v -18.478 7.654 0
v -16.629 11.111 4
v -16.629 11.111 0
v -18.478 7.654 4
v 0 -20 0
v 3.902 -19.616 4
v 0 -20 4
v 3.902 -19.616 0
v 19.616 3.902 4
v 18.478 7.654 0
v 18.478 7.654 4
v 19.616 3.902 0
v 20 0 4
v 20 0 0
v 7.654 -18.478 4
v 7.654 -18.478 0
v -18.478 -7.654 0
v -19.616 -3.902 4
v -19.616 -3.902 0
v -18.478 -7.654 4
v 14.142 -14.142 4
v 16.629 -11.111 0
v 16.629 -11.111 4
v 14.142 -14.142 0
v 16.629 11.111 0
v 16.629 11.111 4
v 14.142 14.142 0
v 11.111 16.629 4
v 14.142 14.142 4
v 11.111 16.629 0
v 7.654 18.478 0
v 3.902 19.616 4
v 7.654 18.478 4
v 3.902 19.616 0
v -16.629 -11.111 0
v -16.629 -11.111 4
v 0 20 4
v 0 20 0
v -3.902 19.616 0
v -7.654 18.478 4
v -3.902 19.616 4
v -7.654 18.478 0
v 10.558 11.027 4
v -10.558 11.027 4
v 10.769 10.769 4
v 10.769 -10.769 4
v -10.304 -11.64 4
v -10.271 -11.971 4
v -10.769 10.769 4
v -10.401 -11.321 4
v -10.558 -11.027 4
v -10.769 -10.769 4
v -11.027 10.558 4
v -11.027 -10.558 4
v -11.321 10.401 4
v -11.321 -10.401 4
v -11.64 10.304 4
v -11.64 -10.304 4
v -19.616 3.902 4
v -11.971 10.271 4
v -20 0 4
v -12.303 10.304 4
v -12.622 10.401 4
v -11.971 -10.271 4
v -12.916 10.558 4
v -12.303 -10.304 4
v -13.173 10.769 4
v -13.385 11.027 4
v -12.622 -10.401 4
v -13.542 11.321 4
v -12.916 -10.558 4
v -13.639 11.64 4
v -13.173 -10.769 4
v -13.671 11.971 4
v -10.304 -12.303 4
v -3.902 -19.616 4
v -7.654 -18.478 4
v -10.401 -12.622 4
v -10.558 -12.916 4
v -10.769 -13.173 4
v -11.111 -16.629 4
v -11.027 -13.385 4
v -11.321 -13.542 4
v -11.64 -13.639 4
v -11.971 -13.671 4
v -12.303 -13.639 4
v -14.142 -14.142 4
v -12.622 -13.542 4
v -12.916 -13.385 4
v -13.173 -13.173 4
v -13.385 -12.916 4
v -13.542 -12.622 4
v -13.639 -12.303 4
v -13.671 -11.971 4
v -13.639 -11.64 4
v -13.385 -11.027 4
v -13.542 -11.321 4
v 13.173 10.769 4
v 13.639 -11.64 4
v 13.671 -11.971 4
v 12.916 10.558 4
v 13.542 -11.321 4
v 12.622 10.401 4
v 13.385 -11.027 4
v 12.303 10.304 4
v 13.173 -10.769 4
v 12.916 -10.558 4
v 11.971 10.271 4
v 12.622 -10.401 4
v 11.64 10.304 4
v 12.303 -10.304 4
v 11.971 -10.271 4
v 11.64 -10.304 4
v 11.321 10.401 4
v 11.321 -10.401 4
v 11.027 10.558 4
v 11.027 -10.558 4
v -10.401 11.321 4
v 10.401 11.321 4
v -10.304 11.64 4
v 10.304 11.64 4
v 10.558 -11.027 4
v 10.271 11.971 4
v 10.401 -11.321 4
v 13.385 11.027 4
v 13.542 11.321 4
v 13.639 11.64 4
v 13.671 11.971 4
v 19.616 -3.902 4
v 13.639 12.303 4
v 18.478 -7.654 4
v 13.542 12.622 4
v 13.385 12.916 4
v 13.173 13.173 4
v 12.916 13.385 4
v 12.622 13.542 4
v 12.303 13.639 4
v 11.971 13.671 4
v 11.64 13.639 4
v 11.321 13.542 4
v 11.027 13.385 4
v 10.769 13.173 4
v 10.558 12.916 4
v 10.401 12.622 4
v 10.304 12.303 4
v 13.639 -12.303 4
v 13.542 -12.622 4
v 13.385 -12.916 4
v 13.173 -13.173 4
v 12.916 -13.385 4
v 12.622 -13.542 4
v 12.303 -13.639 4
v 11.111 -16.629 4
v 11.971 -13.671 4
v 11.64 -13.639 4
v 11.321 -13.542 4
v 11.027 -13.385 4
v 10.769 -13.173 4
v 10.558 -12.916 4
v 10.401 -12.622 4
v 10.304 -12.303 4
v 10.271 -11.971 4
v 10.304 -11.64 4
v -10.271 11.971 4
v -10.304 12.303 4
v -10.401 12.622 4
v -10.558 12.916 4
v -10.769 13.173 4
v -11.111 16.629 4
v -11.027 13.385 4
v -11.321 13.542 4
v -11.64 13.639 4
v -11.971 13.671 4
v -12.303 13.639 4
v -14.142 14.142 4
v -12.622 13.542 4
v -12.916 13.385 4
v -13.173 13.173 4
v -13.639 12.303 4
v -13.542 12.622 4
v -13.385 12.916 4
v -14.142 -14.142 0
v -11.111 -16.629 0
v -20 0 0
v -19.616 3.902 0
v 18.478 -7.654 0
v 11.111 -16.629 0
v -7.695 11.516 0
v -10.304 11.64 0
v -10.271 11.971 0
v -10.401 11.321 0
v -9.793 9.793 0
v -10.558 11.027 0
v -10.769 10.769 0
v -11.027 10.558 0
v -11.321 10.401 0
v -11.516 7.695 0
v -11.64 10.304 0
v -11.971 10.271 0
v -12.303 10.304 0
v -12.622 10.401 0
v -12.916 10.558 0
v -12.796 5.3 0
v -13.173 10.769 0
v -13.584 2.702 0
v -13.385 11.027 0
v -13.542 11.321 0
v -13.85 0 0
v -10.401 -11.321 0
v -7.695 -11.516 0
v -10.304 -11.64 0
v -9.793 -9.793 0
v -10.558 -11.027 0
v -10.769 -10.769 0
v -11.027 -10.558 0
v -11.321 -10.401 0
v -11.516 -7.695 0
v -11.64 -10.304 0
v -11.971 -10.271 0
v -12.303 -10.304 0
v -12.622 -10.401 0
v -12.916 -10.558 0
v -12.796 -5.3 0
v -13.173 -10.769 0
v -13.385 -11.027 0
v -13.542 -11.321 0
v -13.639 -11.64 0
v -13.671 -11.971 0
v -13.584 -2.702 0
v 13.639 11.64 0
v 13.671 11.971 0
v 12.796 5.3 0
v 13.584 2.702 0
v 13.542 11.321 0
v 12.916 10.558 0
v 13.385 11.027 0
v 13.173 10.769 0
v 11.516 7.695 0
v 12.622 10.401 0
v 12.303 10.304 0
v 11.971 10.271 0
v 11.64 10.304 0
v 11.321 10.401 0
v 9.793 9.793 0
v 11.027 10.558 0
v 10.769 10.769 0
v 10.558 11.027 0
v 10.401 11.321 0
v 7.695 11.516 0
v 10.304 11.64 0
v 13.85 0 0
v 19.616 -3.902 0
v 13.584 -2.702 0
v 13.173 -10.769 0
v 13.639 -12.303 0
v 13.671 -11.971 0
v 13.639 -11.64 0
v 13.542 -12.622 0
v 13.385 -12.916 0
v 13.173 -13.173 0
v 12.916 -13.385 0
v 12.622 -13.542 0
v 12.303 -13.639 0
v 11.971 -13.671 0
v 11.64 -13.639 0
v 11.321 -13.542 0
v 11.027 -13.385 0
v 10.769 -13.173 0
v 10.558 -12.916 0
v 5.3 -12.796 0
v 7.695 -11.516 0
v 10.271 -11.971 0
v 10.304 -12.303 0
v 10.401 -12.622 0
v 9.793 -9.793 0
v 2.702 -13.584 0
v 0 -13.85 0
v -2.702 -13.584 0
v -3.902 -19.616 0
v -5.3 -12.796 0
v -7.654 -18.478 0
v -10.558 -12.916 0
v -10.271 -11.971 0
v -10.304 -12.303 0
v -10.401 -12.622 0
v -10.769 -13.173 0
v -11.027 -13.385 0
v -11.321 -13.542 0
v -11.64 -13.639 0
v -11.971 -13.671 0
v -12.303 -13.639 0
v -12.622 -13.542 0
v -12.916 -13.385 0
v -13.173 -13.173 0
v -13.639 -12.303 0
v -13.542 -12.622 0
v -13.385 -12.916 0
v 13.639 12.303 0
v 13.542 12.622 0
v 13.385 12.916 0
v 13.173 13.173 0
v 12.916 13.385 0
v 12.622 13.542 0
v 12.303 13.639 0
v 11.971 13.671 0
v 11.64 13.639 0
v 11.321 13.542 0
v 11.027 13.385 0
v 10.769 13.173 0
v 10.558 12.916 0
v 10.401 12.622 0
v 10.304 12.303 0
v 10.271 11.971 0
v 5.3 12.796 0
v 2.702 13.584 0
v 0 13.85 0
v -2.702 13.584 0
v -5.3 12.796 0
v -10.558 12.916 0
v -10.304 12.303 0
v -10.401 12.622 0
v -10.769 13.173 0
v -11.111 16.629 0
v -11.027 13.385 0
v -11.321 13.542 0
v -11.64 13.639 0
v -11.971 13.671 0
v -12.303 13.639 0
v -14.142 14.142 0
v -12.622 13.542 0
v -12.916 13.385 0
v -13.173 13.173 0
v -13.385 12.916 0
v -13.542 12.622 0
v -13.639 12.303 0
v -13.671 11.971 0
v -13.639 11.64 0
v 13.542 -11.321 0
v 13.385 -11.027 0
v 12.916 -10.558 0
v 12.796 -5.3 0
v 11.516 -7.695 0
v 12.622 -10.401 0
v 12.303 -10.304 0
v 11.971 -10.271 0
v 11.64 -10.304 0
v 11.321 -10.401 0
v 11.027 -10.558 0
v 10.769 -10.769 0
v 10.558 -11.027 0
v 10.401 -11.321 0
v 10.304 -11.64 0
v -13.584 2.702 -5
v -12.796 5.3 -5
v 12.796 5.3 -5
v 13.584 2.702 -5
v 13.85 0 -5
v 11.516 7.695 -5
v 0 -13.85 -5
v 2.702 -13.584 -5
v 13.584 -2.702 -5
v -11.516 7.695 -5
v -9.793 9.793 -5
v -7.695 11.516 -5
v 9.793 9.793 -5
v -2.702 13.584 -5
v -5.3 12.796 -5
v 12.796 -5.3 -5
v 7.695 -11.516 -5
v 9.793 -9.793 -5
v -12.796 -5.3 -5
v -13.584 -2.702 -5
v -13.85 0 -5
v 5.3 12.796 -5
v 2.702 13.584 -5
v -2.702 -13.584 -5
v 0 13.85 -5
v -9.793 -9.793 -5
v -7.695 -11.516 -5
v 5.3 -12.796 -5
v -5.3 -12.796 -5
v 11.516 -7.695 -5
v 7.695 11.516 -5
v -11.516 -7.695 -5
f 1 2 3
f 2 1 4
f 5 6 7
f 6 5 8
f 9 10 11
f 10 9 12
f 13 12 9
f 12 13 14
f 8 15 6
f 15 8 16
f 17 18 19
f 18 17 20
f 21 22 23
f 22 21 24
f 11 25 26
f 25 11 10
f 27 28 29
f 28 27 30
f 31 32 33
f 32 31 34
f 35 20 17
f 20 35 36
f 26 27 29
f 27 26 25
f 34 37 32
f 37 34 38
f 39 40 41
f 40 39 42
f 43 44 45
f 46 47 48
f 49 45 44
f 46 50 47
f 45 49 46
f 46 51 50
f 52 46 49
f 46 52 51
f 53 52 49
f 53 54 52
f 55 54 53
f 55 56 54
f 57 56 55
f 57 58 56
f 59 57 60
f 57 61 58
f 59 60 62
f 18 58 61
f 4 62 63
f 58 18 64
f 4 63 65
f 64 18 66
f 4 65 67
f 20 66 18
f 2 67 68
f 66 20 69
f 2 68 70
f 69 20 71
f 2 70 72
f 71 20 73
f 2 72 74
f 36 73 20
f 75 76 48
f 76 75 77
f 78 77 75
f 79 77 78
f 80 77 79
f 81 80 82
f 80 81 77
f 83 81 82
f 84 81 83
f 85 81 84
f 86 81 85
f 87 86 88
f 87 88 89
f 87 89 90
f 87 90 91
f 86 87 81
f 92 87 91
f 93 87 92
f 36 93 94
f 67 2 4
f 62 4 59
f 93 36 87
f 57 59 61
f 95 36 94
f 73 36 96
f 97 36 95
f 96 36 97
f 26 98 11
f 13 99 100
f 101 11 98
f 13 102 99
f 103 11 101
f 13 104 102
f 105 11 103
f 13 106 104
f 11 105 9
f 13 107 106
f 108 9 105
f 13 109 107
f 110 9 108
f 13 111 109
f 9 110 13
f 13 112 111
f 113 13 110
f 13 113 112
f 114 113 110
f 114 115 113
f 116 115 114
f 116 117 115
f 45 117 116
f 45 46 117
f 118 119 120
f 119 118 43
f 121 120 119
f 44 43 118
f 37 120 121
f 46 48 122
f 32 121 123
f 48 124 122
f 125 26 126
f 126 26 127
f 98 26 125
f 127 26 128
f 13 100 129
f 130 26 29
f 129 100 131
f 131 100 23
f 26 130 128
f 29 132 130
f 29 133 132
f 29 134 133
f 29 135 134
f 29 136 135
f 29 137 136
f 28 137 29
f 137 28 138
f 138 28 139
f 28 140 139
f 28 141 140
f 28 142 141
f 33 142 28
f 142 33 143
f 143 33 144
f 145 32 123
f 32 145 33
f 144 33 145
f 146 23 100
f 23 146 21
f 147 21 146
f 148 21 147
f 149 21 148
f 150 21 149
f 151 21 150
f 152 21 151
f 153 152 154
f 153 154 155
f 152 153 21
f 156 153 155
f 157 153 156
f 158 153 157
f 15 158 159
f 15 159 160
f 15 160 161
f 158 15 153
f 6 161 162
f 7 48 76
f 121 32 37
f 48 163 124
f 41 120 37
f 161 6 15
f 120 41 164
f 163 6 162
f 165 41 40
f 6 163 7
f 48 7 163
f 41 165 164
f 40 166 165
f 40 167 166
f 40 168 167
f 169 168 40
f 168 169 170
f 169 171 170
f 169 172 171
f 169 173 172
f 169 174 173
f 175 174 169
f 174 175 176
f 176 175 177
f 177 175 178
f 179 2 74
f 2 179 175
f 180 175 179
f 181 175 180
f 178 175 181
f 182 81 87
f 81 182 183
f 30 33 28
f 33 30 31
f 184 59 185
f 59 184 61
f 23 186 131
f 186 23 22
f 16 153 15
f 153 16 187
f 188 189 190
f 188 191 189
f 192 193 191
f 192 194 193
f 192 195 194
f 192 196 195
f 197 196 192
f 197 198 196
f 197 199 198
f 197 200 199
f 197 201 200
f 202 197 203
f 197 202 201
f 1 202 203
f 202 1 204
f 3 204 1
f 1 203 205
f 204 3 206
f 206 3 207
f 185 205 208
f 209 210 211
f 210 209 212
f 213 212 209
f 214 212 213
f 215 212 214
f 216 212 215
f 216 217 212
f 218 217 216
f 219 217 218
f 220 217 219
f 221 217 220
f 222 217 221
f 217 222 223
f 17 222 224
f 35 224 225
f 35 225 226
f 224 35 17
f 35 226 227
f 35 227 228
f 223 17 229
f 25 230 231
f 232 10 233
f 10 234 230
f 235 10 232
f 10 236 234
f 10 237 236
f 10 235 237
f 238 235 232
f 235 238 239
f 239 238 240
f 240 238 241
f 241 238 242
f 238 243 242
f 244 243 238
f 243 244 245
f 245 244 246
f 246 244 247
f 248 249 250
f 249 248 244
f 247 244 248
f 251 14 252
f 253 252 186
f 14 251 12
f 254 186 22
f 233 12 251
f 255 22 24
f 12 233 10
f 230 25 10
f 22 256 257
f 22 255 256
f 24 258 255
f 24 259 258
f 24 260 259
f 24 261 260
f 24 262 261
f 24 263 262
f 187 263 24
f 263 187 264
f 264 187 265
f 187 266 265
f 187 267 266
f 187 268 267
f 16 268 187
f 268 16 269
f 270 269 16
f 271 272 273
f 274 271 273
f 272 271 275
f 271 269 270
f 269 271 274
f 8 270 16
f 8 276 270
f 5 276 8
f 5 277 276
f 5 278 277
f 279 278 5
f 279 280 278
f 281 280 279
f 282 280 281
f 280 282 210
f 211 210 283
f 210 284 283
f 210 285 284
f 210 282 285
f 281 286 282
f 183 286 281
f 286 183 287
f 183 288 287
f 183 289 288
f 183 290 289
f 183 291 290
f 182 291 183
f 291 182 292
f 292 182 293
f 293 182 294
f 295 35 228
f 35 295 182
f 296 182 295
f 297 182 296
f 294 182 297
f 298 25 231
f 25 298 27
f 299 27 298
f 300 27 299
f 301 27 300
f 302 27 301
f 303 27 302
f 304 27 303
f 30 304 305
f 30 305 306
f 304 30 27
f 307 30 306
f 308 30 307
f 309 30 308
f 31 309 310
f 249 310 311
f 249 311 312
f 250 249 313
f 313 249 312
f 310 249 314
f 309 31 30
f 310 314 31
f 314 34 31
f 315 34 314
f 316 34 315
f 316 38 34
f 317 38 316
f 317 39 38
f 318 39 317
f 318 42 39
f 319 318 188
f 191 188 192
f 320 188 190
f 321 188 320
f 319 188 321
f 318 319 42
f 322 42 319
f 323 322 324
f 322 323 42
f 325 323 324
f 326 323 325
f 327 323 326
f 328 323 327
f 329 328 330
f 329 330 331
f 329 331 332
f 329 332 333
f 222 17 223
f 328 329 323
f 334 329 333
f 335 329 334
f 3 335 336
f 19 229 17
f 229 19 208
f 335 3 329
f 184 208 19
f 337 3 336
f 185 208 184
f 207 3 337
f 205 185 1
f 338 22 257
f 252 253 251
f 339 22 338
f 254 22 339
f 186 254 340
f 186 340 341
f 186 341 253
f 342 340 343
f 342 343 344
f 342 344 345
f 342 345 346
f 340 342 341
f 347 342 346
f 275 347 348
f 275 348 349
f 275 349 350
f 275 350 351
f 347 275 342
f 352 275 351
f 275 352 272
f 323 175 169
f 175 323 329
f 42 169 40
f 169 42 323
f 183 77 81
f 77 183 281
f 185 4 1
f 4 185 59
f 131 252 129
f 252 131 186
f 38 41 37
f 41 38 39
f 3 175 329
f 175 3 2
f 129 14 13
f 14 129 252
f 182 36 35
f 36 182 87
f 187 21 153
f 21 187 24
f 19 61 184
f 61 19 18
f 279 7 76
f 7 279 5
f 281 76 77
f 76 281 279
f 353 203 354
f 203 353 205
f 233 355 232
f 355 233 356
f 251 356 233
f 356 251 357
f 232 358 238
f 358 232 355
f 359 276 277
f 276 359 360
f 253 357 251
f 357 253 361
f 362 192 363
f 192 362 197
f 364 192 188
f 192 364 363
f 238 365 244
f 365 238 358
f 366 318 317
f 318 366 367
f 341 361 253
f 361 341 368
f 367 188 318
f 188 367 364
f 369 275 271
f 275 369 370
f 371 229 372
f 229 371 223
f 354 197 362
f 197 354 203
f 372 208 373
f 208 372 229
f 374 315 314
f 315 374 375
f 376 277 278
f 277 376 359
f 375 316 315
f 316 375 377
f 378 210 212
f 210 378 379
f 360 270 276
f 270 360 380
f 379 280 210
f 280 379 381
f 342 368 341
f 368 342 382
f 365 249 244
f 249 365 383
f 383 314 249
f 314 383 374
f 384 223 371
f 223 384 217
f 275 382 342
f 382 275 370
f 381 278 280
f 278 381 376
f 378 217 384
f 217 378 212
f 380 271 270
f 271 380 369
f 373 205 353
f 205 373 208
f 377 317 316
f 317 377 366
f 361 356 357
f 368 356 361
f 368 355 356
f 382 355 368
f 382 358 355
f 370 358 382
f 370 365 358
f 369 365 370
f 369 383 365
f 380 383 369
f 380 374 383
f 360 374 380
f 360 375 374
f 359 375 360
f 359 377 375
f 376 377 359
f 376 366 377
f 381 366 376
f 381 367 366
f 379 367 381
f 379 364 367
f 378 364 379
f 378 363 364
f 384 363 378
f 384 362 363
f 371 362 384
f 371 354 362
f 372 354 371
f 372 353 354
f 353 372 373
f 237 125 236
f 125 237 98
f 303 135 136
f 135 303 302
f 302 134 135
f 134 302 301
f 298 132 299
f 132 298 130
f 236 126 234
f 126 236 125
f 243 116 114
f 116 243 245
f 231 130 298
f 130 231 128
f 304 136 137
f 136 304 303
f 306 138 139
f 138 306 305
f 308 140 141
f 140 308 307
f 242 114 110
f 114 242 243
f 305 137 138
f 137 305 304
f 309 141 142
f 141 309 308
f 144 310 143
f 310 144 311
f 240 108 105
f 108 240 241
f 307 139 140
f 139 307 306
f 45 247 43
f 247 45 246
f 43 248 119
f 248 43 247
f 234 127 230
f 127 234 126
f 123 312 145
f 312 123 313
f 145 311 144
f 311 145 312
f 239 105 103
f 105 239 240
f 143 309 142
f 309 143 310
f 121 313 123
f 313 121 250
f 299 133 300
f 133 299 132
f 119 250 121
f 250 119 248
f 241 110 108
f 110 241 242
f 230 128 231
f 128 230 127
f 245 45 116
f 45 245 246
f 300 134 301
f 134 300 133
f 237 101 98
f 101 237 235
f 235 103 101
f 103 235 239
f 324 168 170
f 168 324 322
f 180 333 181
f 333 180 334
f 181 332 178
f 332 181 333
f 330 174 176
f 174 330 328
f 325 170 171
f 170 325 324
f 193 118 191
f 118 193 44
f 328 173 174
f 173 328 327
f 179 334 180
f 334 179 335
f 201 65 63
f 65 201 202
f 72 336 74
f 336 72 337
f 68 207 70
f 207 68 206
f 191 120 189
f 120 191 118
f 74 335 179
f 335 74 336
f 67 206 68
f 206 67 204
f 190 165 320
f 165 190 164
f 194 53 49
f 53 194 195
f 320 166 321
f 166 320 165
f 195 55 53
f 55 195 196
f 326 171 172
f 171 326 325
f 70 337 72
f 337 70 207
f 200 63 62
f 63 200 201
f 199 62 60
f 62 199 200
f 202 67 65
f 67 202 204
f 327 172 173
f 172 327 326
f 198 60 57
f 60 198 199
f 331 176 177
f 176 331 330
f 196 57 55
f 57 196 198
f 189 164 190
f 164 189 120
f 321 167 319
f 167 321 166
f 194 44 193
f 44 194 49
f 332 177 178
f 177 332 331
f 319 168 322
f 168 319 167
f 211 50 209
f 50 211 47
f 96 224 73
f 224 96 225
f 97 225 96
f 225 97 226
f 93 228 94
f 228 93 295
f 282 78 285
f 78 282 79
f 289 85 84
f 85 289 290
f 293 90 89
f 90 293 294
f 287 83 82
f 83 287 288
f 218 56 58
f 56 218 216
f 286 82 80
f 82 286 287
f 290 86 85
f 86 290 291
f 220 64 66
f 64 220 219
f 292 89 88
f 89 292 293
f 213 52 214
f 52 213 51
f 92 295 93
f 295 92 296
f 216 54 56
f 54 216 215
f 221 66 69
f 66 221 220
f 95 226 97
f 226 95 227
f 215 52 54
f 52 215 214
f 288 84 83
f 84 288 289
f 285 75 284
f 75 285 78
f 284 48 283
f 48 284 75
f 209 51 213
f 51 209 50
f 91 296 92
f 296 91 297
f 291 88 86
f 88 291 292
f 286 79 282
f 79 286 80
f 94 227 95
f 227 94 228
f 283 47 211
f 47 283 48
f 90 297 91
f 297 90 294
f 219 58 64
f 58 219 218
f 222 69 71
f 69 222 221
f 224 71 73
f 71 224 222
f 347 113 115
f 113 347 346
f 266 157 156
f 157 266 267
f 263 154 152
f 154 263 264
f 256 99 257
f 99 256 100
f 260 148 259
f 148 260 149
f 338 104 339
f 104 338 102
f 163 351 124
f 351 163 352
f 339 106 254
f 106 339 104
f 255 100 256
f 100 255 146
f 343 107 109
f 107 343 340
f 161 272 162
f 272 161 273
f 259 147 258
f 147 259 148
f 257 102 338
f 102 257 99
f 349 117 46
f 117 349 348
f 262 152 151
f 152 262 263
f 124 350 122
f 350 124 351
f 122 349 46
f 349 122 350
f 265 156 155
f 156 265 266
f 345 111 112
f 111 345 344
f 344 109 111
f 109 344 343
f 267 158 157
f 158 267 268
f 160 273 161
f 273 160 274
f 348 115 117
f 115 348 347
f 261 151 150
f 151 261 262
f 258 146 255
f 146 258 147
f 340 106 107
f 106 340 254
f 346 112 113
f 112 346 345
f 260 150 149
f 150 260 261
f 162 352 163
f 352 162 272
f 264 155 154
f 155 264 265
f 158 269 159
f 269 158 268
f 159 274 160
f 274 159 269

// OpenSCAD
$fn = 32;

// ----------------------------------------------------------------------
// Retaining cap: 6001 cover, 40 mm, spigot 27.7 mm
// ----------------------------------------------------------------------

// --- parameters (mm) ---
cover_d = 40;             // cover diameter
cover_t = 4;              // cover thickness
spigot_d = 27.7;          // spigot that enters the housing
spigot_h = 5;             // spigot height
bolt_d = 3.4;             // bolt clearance
bolt_r = 16.93;           // bolt circle radius

module cover() {
  cylinder(h = cover_t, d = cover_d);
}

module spigot() {
  /* sunk 1 mm into the cover; the spigot sets the overall height */
  translate([0, 0, -spigot_h]) cylinder(h = spigot_h + 1, d = spigot_d);
}

difference() {
  union() {
    cover();
    spigot();
  }
  for (i = [0 : 3]) rotate([0, 0, 45 + i * 90]) translate([bolt_r, 0, -spigot_h - 1])
    cylinder(h = spigot_h + cover_t + 2, d = bolt_d);
}
